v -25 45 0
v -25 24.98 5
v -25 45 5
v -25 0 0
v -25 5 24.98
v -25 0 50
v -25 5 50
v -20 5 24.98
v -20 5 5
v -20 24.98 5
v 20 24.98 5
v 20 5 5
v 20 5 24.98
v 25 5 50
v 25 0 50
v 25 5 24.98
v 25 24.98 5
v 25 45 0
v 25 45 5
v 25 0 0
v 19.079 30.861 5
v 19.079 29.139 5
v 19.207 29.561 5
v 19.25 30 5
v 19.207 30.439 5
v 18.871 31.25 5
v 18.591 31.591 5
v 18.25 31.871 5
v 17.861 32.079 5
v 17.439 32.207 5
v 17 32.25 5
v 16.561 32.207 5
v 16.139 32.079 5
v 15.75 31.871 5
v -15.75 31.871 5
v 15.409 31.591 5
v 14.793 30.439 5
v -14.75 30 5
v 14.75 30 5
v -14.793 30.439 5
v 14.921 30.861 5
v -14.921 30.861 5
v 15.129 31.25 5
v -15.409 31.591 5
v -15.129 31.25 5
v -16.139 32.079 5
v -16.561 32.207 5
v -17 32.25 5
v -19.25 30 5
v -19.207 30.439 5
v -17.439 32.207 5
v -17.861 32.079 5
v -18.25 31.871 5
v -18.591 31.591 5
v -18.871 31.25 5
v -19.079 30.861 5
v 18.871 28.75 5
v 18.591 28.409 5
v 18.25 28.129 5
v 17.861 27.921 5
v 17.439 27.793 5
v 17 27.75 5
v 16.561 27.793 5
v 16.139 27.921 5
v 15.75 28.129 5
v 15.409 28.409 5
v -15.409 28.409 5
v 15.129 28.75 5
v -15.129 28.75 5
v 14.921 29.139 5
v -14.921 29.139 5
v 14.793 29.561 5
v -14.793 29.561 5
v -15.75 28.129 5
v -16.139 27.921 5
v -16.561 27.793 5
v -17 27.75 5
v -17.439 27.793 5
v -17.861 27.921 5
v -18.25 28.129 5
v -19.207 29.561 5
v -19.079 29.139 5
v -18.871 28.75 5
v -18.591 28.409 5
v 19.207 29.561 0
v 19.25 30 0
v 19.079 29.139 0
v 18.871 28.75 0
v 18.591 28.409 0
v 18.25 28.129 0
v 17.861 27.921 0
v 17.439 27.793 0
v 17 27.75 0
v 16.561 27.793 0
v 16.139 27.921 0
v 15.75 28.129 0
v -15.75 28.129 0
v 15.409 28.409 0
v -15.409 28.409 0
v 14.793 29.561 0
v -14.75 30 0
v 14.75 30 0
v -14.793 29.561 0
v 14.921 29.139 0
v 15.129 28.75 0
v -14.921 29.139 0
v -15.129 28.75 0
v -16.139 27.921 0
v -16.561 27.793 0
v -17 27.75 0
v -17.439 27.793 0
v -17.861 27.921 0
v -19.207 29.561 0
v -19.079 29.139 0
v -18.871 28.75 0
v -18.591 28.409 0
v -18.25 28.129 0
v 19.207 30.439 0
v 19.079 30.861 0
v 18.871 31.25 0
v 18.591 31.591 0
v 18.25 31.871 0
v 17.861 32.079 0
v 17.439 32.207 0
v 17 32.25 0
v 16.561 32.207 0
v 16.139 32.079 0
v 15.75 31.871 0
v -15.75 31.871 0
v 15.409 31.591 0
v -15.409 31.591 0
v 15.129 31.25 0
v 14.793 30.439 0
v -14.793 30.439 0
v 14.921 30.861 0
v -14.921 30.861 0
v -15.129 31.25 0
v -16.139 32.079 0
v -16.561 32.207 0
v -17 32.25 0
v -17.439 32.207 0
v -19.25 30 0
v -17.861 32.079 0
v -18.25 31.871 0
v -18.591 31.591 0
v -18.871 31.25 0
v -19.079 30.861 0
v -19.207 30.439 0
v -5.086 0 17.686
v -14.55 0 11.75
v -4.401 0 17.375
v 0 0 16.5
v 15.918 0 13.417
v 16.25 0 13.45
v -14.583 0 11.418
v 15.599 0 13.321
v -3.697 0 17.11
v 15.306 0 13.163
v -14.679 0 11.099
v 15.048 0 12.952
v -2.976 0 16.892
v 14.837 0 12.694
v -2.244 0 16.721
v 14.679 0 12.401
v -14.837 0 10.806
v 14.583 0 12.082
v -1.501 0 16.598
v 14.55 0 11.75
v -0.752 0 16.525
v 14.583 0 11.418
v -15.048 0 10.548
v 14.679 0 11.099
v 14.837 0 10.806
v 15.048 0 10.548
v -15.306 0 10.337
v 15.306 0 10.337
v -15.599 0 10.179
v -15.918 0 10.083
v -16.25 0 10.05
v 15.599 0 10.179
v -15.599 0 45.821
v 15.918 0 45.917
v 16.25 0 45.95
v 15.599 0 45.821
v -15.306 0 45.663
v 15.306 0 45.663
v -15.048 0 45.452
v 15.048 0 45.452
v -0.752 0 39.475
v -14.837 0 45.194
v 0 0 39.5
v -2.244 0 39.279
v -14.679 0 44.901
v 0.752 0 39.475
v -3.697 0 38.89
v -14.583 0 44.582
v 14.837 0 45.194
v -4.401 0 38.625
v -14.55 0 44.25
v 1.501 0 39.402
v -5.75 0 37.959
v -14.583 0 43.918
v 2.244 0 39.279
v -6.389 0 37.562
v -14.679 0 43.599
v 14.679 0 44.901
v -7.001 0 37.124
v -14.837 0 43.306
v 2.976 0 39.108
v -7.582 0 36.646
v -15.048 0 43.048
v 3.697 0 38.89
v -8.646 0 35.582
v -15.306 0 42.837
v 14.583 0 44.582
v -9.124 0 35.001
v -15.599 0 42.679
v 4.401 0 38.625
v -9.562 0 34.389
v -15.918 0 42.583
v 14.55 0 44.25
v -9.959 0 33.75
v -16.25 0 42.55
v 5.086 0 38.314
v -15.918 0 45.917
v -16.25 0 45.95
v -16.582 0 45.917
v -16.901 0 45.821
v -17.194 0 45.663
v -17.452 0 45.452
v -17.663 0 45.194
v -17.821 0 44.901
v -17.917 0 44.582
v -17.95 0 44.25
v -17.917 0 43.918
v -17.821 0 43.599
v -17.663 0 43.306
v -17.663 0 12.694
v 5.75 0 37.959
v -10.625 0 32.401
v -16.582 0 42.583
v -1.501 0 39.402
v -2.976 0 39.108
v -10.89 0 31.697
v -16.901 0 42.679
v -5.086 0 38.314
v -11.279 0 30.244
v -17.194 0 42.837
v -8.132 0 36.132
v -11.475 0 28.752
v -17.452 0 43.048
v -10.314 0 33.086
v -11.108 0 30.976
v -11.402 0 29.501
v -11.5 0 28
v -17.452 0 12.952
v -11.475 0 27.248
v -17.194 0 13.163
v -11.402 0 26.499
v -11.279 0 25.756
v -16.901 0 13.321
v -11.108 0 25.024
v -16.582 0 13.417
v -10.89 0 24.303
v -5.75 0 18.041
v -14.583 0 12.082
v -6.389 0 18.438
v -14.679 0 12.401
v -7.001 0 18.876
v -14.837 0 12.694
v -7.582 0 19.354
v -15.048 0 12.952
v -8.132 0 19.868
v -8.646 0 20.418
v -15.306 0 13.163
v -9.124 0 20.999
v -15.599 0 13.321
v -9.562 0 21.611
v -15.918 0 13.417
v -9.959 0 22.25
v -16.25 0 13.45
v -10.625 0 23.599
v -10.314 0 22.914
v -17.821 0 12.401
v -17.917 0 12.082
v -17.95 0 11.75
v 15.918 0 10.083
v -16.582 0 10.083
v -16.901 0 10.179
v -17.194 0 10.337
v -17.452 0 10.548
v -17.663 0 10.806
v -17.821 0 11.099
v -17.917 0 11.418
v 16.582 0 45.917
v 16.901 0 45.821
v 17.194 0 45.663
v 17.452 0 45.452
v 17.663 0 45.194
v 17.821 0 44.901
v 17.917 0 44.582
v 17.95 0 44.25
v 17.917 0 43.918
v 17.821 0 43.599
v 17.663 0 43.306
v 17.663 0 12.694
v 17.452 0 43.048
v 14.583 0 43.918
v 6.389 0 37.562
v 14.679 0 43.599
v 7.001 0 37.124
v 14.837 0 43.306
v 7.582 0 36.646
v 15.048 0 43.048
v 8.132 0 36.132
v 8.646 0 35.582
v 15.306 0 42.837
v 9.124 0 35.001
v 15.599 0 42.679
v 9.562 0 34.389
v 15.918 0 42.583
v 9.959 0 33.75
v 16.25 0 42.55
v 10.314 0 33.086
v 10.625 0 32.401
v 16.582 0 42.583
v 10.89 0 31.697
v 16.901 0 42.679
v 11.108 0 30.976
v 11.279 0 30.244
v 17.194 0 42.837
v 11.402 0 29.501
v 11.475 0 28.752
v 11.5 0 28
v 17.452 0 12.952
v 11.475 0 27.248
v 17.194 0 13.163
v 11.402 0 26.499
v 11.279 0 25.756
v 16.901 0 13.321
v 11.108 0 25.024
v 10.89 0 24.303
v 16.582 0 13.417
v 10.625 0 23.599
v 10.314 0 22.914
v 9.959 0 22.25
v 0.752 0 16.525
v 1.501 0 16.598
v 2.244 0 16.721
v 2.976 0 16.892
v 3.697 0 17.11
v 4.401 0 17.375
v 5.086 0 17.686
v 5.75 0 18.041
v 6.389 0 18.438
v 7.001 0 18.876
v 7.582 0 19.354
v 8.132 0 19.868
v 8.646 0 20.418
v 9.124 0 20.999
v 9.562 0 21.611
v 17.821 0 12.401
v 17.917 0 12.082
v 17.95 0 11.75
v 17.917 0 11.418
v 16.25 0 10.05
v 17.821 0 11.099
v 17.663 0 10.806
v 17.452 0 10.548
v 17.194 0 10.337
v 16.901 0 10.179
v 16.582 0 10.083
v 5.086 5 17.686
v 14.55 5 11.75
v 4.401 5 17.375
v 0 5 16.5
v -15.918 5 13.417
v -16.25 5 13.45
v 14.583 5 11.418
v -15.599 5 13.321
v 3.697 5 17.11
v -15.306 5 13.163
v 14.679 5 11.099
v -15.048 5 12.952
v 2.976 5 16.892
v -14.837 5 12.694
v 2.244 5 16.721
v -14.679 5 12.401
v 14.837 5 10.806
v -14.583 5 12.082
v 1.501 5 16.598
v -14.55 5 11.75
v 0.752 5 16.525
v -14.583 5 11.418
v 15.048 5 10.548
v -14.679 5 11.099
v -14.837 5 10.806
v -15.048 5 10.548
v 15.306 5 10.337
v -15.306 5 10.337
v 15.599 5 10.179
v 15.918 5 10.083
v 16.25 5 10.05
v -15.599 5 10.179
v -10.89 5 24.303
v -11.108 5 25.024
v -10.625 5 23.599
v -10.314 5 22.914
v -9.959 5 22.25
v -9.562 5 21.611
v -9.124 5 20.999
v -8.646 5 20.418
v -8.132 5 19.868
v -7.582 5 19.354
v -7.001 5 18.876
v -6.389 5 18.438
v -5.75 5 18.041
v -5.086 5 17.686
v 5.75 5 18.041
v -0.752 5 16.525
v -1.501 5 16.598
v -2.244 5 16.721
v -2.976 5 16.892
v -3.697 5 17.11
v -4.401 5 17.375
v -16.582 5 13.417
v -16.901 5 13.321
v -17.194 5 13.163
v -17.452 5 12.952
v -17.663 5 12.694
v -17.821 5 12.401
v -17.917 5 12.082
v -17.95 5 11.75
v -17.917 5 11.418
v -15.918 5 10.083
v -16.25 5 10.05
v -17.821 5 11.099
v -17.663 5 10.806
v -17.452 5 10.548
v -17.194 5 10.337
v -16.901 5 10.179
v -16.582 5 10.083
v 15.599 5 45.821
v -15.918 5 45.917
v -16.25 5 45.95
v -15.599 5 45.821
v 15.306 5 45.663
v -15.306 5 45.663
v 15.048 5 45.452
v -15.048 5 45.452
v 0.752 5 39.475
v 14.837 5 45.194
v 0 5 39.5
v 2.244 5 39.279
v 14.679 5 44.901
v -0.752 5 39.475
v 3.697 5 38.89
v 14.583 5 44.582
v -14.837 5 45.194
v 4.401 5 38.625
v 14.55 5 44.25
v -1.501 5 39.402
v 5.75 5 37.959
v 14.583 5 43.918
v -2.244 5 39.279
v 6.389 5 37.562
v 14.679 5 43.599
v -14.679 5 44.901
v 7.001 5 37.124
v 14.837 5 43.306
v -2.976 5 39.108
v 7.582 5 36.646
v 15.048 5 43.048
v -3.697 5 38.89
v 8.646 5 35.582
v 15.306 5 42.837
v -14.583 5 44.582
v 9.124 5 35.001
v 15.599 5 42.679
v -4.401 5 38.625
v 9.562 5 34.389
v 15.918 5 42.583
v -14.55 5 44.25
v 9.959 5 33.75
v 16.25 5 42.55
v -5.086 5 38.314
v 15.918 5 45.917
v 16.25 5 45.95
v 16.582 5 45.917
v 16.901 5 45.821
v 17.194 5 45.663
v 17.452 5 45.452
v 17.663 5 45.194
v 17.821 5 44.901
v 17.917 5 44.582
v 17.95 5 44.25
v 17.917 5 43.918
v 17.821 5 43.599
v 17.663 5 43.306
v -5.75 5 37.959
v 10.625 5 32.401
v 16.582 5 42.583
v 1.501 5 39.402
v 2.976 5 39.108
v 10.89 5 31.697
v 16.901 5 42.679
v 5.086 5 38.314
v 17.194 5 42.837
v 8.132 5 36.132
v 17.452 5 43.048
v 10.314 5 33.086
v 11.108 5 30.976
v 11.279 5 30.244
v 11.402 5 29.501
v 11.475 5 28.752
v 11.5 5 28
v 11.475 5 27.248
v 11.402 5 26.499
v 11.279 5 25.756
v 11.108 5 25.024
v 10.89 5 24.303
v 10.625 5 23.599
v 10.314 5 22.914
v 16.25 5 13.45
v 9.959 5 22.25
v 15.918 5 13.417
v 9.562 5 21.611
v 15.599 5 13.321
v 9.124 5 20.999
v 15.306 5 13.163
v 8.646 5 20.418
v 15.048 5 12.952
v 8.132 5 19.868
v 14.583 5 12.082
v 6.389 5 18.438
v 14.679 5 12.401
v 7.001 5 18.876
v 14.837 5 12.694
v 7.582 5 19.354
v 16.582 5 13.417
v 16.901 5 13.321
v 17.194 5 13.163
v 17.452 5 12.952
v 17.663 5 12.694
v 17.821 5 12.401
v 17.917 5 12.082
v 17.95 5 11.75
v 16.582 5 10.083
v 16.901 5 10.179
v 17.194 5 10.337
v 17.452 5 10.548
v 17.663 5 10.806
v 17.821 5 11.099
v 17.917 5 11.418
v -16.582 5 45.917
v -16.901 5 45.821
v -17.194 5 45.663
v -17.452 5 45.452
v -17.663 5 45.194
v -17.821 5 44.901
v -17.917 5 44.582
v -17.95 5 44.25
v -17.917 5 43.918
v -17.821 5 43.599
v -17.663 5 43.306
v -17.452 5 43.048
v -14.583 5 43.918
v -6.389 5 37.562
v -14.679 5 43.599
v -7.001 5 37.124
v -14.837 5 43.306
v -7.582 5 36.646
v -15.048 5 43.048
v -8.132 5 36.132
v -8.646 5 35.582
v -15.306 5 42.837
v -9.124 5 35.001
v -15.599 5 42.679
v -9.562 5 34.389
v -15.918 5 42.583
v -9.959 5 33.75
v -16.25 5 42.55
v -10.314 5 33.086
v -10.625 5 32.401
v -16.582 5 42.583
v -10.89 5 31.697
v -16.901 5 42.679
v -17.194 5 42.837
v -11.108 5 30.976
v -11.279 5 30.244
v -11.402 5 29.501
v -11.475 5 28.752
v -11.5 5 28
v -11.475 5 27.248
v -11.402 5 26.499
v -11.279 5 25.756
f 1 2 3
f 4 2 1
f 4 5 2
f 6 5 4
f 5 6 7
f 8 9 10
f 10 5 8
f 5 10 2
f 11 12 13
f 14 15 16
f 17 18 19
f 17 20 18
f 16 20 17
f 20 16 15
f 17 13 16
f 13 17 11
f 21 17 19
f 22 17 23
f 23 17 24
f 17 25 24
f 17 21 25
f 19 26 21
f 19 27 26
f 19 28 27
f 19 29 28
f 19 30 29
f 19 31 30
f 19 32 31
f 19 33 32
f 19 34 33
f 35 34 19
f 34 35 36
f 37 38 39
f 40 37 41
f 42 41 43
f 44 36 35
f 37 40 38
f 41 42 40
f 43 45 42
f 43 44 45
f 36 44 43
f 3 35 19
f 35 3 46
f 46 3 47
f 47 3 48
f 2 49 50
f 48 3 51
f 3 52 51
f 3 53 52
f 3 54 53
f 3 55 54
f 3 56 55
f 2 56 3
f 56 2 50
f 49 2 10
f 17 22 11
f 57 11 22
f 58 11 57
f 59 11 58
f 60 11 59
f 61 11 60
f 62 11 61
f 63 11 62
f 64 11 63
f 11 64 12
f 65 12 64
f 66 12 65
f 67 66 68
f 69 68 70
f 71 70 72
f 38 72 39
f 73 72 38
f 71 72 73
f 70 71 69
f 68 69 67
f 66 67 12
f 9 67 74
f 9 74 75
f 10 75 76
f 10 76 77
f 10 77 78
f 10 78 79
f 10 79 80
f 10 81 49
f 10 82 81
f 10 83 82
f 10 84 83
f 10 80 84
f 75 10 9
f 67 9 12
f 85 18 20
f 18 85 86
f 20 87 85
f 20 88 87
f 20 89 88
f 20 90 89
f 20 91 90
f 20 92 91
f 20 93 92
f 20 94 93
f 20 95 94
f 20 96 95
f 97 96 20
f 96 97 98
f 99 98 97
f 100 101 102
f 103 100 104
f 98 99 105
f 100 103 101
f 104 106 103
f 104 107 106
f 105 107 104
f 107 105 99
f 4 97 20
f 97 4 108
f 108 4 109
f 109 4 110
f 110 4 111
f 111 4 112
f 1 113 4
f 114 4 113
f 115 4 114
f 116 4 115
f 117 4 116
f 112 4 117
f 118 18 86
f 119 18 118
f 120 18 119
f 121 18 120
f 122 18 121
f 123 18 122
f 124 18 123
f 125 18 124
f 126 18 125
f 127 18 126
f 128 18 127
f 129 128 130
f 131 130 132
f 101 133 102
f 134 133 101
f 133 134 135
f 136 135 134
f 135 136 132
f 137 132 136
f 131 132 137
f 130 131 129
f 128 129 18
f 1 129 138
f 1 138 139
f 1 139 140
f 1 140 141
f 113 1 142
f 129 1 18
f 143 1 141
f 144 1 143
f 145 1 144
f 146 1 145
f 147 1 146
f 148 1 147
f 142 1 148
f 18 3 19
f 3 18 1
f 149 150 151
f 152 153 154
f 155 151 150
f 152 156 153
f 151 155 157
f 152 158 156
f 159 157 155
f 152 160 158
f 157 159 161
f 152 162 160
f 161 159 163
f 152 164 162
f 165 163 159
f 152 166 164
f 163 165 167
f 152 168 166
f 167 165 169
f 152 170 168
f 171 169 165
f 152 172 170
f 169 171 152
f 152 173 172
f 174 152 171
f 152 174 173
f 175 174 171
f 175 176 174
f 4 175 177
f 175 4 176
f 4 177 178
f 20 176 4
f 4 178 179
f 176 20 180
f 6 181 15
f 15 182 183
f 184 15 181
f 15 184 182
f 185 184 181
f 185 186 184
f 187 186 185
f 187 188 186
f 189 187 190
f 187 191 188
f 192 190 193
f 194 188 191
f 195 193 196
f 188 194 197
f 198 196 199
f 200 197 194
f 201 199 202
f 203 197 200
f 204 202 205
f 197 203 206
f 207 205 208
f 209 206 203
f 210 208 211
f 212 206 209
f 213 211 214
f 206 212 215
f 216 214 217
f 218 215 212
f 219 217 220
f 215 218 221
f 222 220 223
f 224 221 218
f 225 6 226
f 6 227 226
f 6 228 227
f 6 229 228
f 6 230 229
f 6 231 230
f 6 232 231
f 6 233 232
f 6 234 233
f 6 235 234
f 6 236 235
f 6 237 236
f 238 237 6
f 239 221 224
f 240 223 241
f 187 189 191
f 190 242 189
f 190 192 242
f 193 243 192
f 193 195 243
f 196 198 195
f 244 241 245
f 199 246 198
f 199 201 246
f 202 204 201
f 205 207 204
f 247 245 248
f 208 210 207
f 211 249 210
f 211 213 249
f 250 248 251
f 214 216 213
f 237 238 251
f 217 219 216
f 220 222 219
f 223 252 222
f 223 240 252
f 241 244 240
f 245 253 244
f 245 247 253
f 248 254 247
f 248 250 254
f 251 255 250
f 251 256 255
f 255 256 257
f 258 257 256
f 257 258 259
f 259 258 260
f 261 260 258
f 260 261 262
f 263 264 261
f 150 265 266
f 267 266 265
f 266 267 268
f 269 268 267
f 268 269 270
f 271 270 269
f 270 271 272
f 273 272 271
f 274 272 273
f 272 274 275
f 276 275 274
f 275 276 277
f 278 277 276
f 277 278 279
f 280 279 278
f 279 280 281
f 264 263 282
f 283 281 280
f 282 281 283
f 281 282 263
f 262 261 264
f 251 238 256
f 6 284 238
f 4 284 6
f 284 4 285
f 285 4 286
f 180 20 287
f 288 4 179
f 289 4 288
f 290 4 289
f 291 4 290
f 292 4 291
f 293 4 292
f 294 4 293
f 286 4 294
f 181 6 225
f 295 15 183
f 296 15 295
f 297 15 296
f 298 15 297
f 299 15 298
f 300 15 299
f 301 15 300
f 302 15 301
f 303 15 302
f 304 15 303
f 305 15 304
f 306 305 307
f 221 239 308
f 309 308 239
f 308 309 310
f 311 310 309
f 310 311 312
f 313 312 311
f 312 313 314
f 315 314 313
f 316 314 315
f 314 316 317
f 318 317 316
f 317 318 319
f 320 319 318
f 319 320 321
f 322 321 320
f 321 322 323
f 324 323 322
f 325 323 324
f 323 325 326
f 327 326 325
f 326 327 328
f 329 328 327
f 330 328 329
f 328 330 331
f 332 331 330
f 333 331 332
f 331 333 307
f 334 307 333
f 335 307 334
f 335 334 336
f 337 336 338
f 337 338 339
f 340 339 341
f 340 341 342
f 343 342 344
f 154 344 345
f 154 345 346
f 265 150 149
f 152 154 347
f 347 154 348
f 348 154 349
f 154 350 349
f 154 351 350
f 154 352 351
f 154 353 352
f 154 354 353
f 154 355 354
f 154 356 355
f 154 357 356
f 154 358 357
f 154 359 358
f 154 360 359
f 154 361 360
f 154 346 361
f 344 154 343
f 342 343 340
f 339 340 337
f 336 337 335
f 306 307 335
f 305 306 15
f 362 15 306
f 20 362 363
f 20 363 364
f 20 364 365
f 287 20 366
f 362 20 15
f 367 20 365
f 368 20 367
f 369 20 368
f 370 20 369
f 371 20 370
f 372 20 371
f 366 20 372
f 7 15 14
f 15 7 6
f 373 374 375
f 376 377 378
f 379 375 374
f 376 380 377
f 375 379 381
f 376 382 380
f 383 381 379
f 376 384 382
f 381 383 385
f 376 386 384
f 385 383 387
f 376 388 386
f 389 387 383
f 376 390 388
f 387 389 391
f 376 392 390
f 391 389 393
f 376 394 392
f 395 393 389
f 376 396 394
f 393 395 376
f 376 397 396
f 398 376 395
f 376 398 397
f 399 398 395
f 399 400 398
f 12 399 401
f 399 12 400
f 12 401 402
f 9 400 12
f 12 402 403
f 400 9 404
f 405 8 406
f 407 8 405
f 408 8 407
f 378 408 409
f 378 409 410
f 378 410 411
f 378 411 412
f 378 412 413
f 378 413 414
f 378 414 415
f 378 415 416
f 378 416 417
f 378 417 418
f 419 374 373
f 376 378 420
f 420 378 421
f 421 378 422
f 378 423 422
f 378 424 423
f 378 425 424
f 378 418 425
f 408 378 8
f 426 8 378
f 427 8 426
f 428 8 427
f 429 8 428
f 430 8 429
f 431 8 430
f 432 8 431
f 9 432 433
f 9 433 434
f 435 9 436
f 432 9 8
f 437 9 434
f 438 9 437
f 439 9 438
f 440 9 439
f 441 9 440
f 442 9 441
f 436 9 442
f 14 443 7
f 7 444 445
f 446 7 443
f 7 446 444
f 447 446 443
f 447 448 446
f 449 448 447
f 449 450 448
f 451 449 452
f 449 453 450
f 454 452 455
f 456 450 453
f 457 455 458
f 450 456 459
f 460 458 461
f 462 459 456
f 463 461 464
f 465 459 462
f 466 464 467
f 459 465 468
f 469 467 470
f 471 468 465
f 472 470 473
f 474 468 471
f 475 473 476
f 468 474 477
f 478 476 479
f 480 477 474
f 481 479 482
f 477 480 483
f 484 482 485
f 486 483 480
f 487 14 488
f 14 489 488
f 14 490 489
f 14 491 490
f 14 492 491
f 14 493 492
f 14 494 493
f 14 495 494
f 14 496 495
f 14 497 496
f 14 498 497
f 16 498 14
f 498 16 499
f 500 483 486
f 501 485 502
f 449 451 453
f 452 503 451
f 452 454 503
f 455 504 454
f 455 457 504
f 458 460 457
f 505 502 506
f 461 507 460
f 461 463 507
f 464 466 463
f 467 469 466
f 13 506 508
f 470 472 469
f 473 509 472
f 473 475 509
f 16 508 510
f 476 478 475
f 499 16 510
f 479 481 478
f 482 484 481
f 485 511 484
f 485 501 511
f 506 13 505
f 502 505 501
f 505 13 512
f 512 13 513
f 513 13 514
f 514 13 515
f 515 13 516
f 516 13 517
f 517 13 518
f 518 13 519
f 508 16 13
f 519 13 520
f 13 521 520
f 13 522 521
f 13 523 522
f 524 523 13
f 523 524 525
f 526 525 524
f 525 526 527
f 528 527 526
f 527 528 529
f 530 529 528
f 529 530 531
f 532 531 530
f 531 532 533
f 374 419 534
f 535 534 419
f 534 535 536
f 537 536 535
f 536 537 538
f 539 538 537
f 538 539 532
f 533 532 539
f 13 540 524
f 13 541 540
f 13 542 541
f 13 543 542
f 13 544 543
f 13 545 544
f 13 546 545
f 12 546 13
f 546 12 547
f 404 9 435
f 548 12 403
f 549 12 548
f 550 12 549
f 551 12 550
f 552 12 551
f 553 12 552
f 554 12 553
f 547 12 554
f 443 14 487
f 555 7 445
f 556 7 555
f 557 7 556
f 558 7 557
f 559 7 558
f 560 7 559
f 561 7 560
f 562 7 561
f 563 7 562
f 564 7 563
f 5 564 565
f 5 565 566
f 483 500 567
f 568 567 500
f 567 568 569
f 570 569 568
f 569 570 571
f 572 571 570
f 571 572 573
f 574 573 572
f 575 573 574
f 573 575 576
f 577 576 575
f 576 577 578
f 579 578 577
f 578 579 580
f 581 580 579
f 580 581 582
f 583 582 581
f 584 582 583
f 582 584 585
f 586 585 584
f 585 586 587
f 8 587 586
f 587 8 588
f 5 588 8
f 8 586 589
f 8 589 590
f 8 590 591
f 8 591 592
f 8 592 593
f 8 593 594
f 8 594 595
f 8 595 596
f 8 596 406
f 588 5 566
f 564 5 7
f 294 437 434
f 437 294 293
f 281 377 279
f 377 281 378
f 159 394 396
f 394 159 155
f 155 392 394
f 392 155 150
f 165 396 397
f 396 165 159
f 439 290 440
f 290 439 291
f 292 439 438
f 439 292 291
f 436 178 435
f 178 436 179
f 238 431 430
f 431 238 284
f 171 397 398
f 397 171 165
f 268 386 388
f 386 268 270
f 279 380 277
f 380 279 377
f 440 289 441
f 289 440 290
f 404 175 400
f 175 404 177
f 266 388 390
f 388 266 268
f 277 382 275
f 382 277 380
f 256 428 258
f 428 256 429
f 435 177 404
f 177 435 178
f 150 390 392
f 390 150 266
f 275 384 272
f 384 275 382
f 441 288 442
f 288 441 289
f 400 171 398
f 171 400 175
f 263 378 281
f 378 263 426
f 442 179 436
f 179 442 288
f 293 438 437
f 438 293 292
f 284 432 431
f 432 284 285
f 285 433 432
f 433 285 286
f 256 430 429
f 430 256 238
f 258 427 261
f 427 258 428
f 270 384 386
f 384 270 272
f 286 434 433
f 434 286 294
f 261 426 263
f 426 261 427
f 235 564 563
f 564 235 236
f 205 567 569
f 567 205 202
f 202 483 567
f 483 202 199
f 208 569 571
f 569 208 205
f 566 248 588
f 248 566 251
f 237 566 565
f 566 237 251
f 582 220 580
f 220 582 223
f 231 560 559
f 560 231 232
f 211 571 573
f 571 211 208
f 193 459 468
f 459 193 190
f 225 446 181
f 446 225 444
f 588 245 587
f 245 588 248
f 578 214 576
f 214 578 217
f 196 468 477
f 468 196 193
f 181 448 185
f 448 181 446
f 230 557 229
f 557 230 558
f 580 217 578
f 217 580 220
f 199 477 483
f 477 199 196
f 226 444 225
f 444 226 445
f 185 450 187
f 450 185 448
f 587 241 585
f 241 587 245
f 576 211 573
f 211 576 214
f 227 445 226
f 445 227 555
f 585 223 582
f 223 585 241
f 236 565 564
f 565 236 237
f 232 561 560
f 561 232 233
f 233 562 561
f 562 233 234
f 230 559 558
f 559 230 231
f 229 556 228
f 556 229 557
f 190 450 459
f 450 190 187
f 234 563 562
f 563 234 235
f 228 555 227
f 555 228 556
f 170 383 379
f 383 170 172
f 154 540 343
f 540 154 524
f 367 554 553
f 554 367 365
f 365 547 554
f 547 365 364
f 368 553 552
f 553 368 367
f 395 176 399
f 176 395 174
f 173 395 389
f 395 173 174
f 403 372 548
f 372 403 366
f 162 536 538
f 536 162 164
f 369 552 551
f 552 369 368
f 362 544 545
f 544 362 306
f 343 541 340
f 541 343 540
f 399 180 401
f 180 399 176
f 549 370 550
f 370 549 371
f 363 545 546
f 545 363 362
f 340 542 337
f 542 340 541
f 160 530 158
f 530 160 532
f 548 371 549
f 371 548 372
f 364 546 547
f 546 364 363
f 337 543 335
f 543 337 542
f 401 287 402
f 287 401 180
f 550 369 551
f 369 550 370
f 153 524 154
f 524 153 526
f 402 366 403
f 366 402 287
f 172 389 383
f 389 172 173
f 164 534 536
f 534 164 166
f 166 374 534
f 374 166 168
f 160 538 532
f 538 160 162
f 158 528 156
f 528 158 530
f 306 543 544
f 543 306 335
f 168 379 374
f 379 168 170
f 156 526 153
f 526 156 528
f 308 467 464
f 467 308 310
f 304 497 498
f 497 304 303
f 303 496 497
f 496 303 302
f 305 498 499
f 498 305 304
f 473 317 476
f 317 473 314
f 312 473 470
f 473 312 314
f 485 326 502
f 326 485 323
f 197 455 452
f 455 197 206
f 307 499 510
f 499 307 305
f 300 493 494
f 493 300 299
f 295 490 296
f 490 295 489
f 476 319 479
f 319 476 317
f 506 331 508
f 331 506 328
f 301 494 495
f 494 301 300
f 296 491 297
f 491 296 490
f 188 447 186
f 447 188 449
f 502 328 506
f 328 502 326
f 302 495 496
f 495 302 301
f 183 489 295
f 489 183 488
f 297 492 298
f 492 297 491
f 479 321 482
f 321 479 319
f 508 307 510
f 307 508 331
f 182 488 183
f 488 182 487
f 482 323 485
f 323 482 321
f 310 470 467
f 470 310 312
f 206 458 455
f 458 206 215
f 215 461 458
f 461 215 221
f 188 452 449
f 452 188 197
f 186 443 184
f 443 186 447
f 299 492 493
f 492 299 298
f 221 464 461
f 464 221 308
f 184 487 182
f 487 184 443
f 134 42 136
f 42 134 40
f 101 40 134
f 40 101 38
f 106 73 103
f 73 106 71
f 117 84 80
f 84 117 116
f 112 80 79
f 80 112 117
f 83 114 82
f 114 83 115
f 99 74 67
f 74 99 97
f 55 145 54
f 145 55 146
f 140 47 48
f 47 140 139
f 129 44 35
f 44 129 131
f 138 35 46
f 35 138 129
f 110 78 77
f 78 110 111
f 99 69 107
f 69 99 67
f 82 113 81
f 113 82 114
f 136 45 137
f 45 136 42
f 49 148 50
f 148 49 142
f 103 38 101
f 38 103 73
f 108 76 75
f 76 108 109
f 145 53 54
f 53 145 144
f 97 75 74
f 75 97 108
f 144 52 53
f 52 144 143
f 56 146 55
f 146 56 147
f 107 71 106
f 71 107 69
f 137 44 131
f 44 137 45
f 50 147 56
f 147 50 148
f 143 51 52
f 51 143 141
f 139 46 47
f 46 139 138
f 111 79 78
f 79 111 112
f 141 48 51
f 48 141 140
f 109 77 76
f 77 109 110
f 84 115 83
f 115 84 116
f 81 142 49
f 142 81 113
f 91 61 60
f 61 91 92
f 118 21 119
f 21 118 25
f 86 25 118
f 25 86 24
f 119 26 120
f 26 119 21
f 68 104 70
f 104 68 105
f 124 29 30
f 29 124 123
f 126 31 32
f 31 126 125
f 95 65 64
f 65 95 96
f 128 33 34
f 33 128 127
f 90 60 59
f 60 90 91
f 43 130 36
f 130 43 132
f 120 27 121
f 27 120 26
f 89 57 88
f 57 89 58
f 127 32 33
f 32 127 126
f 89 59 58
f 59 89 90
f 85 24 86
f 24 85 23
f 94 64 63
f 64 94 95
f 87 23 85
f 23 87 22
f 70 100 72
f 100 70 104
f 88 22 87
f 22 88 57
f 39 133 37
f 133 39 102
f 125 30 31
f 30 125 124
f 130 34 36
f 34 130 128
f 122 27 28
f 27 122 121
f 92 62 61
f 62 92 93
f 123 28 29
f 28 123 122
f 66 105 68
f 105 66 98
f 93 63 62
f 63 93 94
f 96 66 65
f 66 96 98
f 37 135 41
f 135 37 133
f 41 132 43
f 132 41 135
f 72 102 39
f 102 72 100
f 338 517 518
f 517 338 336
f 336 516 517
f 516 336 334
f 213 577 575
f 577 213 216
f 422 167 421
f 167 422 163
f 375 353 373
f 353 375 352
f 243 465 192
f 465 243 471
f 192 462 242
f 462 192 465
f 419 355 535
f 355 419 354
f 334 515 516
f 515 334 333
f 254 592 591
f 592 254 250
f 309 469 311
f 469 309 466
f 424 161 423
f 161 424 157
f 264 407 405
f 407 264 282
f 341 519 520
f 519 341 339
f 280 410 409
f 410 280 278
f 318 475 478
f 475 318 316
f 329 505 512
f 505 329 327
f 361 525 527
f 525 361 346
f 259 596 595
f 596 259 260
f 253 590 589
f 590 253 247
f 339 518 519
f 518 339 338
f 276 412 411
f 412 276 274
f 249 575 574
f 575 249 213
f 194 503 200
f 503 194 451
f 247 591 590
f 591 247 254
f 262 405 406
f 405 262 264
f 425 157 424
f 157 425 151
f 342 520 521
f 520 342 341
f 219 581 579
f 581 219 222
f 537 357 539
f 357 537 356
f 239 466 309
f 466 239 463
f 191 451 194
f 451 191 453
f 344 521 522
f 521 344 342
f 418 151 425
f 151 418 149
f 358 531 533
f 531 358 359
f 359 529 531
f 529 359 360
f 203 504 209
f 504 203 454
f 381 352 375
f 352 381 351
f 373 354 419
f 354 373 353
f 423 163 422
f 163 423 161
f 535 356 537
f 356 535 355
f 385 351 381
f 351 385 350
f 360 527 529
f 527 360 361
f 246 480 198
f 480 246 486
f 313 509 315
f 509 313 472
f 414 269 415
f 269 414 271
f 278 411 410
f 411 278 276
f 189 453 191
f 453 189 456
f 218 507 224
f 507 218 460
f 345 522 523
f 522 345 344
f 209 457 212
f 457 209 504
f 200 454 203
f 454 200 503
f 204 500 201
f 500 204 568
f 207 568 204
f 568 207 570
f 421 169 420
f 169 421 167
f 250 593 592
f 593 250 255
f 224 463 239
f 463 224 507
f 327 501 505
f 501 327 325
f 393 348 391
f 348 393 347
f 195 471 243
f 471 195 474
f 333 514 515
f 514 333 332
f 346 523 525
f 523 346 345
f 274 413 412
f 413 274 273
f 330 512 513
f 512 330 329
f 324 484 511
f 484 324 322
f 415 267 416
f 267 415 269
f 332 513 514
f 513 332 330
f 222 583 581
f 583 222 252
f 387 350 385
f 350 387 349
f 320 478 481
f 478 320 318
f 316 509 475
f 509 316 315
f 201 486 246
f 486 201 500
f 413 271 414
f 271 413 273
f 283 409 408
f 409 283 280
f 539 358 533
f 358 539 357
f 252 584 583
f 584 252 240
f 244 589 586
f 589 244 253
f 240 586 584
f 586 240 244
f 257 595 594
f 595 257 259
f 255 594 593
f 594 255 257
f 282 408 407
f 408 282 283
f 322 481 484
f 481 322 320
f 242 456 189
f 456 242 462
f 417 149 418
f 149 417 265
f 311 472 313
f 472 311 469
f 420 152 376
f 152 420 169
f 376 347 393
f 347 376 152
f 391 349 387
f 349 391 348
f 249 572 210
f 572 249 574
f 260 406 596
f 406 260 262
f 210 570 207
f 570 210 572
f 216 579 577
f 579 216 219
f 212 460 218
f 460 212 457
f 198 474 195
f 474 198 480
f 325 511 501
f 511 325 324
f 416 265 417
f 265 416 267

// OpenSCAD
// L-bracket for a NEMA 17 stepper motor (syringe pumps, peristaltic pumps, shakers)
// Category: full hardware. Base plate with two M4 holes, vertical motor plate with
// the 22 mm boss hole + 31 mm M3 pattern, two gussets. Motor body mounts on the
// back (-Y) side, shaft pointing over the base.
// Print: PETG, base on the bed, 0.2 mm layers, 5 perimeters, 30 % infill.
// SPDX-License-Identifier: CERN-OHL-P-2.0

/* [Bracket] */
base = [50, 45, 5];      // X, Y, Z: spans y = 0..45
plate = [50, 5, 50];     // vertical plate at y = 0..5
boss_d = 23;             // NEMA 17 centring boss is 22 mm
boss_z = 28;             // motor axis height
screw_d = 3.4;           // M3 clearance
screw_spacing = 32.5;      // NEMA 17 bolt pattern
mount_d = 4.5;           // M4 clearance
mount_pos = [[-17, 30], [17, 30]];
gusset_t = 5;
gusset_len = 20;

/* [Hidden] */
eps = 0.01;

difference() {
    union() {
        translate([-base.x / 2, 0, 0]) cube(base);
        translate([-plate.x / 2, 0, 0]) cube(plate);
        for (sx = [-1, 1])
            translate([sx * (base.x / 2 - gusset_t / 2) - gusset_t / 2, plate.y - eps, base.z - eps])
                rotate([90, 0, 90]) linear_extrude(gusset_t)
                    polygon([[0, 0], [gusset_len, 0], [0, gusset_len]]);
    }
    translate([0, -1, boss_z]) rotate([-90, 0, 0]) cylinder(d = boss_d, h = plate.y + 2, $fn = 96);
    for (sx = [-1, 1], sz = [-1, 1])
        translate([sx * screw_spacing / 2, -1, boss_z + sz * screw_spacing / 2])
            rotate([-90, 0, 0]) cylinder(d = screw_d, h = plate.y + 2, $fn = 32);
    for (p = mount_pos)
        translate([p.x, p.y, -1]) cylinder(d = mount_d, h = base.z + 2, $fn = 32);
}
